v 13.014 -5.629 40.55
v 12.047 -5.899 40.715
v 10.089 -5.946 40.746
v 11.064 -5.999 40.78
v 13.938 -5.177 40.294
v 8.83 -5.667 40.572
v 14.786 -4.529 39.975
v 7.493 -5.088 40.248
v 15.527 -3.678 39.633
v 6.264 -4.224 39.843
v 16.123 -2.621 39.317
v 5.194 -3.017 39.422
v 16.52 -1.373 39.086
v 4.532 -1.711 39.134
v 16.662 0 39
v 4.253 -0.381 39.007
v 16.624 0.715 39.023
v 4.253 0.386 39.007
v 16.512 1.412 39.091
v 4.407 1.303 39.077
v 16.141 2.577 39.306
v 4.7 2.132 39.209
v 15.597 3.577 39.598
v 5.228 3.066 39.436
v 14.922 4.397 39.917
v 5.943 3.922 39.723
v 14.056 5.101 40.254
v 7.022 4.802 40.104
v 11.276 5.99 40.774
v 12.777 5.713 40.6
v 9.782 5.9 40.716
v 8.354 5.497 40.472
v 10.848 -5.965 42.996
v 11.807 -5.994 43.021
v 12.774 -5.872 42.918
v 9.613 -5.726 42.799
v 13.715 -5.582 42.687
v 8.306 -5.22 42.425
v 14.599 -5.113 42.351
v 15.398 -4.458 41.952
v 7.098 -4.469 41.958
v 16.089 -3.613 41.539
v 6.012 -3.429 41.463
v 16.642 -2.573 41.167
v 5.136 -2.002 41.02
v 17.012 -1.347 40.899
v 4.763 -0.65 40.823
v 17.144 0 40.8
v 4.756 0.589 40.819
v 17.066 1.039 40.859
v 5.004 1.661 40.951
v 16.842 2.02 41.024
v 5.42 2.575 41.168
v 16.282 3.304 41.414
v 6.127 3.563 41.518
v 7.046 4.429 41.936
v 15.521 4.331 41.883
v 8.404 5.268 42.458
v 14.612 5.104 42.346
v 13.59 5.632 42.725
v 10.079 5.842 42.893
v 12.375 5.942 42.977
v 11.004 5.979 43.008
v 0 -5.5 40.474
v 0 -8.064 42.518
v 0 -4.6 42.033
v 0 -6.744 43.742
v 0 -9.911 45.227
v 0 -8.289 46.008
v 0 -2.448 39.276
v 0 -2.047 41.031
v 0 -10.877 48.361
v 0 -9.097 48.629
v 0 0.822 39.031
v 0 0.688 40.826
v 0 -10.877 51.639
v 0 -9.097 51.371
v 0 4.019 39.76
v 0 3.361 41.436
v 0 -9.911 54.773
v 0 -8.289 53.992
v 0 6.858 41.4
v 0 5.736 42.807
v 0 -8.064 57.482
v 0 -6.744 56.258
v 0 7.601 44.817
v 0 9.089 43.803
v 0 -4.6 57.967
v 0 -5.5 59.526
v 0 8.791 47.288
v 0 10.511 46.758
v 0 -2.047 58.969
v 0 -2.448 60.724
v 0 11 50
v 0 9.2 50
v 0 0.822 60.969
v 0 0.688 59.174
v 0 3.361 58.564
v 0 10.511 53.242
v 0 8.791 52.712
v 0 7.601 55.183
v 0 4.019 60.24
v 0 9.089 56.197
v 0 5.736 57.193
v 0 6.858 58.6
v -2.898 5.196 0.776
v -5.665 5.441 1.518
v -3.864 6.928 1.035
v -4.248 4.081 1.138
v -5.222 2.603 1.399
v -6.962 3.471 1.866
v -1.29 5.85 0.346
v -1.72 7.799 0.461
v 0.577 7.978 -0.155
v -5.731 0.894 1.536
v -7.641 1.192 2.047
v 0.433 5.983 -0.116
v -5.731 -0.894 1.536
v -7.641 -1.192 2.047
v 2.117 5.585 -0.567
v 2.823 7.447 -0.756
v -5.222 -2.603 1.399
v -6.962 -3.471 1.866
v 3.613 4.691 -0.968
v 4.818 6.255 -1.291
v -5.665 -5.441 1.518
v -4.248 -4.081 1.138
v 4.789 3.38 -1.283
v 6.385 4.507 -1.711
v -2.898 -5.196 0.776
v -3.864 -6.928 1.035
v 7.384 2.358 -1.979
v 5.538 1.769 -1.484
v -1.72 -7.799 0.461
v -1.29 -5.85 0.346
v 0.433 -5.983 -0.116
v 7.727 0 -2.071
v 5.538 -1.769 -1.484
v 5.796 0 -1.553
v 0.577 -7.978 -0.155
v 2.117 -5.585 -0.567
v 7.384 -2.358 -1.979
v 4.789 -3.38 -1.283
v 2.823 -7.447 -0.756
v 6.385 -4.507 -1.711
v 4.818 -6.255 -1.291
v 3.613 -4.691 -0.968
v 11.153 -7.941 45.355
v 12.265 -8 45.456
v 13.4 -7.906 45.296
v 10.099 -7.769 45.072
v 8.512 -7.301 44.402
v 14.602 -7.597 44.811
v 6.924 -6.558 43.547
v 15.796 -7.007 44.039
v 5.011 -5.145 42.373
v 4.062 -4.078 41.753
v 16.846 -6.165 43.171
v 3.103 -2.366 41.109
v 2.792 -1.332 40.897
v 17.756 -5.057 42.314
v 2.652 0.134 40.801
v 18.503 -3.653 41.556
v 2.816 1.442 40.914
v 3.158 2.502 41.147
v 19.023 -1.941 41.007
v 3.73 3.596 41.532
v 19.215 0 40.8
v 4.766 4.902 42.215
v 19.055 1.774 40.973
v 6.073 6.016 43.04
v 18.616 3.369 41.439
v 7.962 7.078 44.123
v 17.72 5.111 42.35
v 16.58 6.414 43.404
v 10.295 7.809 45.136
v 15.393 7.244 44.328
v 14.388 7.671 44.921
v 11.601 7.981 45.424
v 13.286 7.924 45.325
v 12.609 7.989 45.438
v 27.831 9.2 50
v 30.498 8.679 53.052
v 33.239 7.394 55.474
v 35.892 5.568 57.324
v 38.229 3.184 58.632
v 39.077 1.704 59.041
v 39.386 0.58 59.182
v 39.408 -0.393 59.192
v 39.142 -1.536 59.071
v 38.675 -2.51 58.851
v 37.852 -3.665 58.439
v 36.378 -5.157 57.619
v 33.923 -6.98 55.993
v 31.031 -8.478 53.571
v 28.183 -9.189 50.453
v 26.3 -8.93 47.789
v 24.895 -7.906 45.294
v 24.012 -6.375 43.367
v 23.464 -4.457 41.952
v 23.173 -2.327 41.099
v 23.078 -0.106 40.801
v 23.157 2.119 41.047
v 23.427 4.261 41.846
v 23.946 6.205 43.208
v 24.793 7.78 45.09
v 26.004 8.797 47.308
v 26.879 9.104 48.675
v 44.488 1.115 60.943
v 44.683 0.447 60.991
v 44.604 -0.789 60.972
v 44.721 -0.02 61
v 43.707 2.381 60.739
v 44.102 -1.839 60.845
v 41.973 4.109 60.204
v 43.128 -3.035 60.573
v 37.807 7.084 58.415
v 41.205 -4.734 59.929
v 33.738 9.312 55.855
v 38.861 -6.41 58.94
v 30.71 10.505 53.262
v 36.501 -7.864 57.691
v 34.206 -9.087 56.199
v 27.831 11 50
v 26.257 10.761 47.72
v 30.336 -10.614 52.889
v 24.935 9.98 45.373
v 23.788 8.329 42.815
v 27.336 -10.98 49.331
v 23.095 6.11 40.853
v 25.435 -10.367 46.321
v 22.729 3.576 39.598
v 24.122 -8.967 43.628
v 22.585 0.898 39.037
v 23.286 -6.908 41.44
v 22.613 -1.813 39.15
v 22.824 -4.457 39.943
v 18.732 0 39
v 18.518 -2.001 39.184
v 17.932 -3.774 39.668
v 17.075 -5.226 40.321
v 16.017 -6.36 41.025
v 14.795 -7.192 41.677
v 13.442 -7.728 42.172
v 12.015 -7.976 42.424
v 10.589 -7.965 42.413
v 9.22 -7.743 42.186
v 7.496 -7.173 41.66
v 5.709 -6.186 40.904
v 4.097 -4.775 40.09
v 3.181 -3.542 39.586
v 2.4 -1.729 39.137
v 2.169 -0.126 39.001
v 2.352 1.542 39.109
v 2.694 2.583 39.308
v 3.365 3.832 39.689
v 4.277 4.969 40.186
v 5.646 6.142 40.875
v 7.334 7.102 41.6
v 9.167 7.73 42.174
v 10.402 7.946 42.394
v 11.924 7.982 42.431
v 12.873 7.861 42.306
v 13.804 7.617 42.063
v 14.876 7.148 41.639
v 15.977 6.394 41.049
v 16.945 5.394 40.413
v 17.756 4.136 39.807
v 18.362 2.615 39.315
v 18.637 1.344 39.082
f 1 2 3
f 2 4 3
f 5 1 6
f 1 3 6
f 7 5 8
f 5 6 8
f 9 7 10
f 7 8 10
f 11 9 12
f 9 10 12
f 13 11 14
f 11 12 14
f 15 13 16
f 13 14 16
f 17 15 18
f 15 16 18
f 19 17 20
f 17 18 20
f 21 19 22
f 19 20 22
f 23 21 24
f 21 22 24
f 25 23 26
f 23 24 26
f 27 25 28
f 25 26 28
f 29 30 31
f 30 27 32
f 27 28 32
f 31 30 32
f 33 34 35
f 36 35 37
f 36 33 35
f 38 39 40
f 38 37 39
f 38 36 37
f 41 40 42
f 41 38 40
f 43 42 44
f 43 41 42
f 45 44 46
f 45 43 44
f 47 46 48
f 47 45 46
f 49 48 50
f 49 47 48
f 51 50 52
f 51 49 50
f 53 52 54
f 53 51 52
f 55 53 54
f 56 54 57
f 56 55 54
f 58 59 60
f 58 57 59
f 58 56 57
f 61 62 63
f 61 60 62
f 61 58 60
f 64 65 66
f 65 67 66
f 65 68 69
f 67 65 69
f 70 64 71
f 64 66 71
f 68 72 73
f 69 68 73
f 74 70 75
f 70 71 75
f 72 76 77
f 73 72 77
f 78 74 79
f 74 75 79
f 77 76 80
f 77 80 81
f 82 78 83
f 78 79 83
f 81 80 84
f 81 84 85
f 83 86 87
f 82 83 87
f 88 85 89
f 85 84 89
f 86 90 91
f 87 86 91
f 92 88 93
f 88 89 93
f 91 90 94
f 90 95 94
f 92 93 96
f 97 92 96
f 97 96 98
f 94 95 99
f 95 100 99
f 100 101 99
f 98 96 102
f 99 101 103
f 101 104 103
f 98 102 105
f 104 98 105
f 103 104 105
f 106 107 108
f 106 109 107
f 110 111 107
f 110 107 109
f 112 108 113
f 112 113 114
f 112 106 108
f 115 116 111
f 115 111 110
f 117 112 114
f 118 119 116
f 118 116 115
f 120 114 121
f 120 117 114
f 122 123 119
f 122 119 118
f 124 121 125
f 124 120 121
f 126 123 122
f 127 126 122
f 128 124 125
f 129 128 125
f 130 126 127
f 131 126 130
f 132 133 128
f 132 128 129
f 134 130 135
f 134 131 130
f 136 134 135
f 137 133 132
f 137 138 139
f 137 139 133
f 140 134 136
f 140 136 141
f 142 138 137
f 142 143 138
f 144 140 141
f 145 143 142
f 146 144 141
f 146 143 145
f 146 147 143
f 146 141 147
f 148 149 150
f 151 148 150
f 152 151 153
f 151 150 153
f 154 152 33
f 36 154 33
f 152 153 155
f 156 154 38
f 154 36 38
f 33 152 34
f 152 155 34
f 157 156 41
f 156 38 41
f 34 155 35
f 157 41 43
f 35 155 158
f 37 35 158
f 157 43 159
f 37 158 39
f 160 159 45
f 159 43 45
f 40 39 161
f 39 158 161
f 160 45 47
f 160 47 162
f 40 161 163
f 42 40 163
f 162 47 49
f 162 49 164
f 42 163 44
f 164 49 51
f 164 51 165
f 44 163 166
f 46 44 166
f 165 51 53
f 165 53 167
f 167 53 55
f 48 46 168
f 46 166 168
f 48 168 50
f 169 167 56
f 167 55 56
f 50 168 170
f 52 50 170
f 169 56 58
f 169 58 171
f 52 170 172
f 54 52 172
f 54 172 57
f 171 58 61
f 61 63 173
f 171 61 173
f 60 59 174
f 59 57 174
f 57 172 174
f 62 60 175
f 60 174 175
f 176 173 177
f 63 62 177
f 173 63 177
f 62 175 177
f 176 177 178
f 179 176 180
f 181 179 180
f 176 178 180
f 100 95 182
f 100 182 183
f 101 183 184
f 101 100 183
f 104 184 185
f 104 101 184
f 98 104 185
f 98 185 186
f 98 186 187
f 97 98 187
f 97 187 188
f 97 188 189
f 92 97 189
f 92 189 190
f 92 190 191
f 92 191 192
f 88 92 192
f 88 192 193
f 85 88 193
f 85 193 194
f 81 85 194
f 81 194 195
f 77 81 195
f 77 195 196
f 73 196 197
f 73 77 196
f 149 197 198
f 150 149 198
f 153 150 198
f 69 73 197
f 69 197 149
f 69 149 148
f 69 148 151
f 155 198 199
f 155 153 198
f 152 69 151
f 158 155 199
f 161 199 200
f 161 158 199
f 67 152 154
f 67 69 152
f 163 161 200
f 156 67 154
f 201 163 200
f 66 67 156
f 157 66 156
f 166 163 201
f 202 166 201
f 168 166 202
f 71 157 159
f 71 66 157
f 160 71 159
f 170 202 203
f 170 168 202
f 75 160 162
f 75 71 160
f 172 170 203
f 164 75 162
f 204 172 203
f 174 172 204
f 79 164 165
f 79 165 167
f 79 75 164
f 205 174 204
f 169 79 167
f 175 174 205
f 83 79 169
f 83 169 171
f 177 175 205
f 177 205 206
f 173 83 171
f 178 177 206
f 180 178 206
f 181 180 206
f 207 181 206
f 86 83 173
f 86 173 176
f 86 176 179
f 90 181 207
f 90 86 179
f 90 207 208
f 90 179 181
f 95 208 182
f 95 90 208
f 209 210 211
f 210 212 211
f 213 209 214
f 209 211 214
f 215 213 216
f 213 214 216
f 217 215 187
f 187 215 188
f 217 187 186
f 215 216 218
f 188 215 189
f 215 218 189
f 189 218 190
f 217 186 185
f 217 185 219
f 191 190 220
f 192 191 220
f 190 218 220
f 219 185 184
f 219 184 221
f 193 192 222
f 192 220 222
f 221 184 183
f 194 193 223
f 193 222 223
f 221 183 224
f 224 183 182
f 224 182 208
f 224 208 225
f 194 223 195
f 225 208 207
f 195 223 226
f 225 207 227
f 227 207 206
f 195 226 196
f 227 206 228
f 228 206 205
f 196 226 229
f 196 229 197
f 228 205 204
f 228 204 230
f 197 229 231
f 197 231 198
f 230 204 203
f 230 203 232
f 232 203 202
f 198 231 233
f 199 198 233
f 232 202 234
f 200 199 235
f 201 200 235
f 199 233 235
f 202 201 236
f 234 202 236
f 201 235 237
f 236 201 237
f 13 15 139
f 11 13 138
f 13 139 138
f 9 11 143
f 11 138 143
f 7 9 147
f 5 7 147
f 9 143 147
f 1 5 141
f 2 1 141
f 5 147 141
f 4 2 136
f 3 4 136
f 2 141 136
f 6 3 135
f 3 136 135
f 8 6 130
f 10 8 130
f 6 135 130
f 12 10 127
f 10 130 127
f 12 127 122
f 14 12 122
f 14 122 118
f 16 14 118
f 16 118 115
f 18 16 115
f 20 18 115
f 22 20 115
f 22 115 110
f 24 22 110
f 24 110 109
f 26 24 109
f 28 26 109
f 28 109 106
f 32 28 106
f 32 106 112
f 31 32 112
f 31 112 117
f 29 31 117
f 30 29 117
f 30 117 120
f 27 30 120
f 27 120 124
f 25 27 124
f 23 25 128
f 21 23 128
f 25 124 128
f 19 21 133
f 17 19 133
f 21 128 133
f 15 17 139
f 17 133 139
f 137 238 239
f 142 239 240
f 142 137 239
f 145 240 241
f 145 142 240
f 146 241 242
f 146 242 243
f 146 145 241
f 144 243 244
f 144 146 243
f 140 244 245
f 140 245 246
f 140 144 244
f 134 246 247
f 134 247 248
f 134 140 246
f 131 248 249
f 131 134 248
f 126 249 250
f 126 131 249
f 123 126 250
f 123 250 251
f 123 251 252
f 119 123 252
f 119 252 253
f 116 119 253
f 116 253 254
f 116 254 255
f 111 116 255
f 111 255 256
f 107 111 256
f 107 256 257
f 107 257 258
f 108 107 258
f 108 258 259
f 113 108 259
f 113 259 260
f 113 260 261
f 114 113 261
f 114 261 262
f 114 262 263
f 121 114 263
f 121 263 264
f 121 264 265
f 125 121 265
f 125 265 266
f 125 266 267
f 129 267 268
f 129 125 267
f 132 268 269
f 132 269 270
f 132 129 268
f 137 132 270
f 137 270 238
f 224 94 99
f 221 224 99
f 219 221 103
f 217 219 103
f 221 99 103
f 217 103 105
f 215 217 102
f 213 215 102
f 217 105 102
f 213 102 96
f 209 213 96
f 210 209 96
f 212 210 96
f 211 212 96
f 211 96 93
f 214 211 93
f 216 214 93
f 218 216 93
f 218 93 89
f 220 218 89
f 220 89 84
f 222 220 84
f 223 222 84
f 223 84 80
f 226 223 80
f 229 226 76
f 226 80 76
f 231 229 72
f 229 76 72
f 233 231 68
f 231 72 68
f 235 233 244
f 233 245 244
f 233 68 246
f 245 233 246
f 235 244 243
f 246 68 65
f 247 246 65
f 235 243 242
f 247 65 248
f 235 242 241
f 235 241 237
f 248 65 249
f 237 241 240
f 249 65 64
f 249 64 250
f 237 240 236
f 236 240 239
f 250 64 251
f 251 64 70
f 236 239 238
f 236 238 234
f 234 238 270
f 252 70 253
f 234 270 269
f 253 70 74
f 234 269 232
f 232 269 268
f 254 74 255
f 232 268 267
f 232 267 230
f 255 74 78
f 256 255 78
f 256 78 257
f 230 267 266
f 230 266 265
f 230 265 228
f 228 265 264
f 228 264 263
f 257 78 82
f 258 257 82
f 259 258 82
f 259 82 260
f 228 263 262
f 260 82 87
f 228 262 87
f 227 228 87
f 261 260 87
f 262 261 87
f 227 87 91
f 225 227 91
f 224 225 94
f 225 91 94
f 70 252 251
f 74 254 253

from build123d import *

# Parameters (mm, degrees)
F3_R      = 8
F3_R_2    = 6
F4_DEPTH  = 50
F5_R      = 11
F5_R_2    = 9.2
F6_DEPTH  = 50
F7_R      = 9.2
F8_DEPTH  = 57.7284067103
F9_R      = 29.9655409023
F10_DEPTH = 12.5


with BuildPart() as f4:
    # F3 (on 3pt) → F4 (new body)
    with BuildSketch(Plane(origin=(0, 0, 0), x_dir=(0.9659258263, 0, -0.2588190451), z_dir=(-0.2588190451, 0, -0.9659258263))):
        Circle(F3_R)
        Circle(F3_R_2, mode=Mode.SUBTRACT)
    extrude(amount=-F4_DEPTH)

    # F5 (on Right) → F6 (join)
    with BuildSketch(Plane.YZ):
        with Locations((0, 50)):
            Circle(F5_R)
        with Locations((0, 50)):
            Circle(F5_R_2, mode=Mode.SUBTRACT)
    extrude(amount=F6_DEPTH)

    # F7 (on face) → F8 (cut, through all)
    with BuildSketch(Plane.YZ.offset(50)):
        with Locations((0, 50)):
            Circle(F7_R)
    extrude(amount=-F8_DEPTH, mode=Mode.SUBTRACT)

    # F9 (on Front) → F10 (cut, symmetric)
    with BuildSketch(Plane.XZ):
        with Locations((51.6765899956, 31.8527929485)):
            Circle(F9_R)
    extrude(amount=F10_DEPTH, both=True, mode=Mode.SUBTRACT)


solid = f4.part
